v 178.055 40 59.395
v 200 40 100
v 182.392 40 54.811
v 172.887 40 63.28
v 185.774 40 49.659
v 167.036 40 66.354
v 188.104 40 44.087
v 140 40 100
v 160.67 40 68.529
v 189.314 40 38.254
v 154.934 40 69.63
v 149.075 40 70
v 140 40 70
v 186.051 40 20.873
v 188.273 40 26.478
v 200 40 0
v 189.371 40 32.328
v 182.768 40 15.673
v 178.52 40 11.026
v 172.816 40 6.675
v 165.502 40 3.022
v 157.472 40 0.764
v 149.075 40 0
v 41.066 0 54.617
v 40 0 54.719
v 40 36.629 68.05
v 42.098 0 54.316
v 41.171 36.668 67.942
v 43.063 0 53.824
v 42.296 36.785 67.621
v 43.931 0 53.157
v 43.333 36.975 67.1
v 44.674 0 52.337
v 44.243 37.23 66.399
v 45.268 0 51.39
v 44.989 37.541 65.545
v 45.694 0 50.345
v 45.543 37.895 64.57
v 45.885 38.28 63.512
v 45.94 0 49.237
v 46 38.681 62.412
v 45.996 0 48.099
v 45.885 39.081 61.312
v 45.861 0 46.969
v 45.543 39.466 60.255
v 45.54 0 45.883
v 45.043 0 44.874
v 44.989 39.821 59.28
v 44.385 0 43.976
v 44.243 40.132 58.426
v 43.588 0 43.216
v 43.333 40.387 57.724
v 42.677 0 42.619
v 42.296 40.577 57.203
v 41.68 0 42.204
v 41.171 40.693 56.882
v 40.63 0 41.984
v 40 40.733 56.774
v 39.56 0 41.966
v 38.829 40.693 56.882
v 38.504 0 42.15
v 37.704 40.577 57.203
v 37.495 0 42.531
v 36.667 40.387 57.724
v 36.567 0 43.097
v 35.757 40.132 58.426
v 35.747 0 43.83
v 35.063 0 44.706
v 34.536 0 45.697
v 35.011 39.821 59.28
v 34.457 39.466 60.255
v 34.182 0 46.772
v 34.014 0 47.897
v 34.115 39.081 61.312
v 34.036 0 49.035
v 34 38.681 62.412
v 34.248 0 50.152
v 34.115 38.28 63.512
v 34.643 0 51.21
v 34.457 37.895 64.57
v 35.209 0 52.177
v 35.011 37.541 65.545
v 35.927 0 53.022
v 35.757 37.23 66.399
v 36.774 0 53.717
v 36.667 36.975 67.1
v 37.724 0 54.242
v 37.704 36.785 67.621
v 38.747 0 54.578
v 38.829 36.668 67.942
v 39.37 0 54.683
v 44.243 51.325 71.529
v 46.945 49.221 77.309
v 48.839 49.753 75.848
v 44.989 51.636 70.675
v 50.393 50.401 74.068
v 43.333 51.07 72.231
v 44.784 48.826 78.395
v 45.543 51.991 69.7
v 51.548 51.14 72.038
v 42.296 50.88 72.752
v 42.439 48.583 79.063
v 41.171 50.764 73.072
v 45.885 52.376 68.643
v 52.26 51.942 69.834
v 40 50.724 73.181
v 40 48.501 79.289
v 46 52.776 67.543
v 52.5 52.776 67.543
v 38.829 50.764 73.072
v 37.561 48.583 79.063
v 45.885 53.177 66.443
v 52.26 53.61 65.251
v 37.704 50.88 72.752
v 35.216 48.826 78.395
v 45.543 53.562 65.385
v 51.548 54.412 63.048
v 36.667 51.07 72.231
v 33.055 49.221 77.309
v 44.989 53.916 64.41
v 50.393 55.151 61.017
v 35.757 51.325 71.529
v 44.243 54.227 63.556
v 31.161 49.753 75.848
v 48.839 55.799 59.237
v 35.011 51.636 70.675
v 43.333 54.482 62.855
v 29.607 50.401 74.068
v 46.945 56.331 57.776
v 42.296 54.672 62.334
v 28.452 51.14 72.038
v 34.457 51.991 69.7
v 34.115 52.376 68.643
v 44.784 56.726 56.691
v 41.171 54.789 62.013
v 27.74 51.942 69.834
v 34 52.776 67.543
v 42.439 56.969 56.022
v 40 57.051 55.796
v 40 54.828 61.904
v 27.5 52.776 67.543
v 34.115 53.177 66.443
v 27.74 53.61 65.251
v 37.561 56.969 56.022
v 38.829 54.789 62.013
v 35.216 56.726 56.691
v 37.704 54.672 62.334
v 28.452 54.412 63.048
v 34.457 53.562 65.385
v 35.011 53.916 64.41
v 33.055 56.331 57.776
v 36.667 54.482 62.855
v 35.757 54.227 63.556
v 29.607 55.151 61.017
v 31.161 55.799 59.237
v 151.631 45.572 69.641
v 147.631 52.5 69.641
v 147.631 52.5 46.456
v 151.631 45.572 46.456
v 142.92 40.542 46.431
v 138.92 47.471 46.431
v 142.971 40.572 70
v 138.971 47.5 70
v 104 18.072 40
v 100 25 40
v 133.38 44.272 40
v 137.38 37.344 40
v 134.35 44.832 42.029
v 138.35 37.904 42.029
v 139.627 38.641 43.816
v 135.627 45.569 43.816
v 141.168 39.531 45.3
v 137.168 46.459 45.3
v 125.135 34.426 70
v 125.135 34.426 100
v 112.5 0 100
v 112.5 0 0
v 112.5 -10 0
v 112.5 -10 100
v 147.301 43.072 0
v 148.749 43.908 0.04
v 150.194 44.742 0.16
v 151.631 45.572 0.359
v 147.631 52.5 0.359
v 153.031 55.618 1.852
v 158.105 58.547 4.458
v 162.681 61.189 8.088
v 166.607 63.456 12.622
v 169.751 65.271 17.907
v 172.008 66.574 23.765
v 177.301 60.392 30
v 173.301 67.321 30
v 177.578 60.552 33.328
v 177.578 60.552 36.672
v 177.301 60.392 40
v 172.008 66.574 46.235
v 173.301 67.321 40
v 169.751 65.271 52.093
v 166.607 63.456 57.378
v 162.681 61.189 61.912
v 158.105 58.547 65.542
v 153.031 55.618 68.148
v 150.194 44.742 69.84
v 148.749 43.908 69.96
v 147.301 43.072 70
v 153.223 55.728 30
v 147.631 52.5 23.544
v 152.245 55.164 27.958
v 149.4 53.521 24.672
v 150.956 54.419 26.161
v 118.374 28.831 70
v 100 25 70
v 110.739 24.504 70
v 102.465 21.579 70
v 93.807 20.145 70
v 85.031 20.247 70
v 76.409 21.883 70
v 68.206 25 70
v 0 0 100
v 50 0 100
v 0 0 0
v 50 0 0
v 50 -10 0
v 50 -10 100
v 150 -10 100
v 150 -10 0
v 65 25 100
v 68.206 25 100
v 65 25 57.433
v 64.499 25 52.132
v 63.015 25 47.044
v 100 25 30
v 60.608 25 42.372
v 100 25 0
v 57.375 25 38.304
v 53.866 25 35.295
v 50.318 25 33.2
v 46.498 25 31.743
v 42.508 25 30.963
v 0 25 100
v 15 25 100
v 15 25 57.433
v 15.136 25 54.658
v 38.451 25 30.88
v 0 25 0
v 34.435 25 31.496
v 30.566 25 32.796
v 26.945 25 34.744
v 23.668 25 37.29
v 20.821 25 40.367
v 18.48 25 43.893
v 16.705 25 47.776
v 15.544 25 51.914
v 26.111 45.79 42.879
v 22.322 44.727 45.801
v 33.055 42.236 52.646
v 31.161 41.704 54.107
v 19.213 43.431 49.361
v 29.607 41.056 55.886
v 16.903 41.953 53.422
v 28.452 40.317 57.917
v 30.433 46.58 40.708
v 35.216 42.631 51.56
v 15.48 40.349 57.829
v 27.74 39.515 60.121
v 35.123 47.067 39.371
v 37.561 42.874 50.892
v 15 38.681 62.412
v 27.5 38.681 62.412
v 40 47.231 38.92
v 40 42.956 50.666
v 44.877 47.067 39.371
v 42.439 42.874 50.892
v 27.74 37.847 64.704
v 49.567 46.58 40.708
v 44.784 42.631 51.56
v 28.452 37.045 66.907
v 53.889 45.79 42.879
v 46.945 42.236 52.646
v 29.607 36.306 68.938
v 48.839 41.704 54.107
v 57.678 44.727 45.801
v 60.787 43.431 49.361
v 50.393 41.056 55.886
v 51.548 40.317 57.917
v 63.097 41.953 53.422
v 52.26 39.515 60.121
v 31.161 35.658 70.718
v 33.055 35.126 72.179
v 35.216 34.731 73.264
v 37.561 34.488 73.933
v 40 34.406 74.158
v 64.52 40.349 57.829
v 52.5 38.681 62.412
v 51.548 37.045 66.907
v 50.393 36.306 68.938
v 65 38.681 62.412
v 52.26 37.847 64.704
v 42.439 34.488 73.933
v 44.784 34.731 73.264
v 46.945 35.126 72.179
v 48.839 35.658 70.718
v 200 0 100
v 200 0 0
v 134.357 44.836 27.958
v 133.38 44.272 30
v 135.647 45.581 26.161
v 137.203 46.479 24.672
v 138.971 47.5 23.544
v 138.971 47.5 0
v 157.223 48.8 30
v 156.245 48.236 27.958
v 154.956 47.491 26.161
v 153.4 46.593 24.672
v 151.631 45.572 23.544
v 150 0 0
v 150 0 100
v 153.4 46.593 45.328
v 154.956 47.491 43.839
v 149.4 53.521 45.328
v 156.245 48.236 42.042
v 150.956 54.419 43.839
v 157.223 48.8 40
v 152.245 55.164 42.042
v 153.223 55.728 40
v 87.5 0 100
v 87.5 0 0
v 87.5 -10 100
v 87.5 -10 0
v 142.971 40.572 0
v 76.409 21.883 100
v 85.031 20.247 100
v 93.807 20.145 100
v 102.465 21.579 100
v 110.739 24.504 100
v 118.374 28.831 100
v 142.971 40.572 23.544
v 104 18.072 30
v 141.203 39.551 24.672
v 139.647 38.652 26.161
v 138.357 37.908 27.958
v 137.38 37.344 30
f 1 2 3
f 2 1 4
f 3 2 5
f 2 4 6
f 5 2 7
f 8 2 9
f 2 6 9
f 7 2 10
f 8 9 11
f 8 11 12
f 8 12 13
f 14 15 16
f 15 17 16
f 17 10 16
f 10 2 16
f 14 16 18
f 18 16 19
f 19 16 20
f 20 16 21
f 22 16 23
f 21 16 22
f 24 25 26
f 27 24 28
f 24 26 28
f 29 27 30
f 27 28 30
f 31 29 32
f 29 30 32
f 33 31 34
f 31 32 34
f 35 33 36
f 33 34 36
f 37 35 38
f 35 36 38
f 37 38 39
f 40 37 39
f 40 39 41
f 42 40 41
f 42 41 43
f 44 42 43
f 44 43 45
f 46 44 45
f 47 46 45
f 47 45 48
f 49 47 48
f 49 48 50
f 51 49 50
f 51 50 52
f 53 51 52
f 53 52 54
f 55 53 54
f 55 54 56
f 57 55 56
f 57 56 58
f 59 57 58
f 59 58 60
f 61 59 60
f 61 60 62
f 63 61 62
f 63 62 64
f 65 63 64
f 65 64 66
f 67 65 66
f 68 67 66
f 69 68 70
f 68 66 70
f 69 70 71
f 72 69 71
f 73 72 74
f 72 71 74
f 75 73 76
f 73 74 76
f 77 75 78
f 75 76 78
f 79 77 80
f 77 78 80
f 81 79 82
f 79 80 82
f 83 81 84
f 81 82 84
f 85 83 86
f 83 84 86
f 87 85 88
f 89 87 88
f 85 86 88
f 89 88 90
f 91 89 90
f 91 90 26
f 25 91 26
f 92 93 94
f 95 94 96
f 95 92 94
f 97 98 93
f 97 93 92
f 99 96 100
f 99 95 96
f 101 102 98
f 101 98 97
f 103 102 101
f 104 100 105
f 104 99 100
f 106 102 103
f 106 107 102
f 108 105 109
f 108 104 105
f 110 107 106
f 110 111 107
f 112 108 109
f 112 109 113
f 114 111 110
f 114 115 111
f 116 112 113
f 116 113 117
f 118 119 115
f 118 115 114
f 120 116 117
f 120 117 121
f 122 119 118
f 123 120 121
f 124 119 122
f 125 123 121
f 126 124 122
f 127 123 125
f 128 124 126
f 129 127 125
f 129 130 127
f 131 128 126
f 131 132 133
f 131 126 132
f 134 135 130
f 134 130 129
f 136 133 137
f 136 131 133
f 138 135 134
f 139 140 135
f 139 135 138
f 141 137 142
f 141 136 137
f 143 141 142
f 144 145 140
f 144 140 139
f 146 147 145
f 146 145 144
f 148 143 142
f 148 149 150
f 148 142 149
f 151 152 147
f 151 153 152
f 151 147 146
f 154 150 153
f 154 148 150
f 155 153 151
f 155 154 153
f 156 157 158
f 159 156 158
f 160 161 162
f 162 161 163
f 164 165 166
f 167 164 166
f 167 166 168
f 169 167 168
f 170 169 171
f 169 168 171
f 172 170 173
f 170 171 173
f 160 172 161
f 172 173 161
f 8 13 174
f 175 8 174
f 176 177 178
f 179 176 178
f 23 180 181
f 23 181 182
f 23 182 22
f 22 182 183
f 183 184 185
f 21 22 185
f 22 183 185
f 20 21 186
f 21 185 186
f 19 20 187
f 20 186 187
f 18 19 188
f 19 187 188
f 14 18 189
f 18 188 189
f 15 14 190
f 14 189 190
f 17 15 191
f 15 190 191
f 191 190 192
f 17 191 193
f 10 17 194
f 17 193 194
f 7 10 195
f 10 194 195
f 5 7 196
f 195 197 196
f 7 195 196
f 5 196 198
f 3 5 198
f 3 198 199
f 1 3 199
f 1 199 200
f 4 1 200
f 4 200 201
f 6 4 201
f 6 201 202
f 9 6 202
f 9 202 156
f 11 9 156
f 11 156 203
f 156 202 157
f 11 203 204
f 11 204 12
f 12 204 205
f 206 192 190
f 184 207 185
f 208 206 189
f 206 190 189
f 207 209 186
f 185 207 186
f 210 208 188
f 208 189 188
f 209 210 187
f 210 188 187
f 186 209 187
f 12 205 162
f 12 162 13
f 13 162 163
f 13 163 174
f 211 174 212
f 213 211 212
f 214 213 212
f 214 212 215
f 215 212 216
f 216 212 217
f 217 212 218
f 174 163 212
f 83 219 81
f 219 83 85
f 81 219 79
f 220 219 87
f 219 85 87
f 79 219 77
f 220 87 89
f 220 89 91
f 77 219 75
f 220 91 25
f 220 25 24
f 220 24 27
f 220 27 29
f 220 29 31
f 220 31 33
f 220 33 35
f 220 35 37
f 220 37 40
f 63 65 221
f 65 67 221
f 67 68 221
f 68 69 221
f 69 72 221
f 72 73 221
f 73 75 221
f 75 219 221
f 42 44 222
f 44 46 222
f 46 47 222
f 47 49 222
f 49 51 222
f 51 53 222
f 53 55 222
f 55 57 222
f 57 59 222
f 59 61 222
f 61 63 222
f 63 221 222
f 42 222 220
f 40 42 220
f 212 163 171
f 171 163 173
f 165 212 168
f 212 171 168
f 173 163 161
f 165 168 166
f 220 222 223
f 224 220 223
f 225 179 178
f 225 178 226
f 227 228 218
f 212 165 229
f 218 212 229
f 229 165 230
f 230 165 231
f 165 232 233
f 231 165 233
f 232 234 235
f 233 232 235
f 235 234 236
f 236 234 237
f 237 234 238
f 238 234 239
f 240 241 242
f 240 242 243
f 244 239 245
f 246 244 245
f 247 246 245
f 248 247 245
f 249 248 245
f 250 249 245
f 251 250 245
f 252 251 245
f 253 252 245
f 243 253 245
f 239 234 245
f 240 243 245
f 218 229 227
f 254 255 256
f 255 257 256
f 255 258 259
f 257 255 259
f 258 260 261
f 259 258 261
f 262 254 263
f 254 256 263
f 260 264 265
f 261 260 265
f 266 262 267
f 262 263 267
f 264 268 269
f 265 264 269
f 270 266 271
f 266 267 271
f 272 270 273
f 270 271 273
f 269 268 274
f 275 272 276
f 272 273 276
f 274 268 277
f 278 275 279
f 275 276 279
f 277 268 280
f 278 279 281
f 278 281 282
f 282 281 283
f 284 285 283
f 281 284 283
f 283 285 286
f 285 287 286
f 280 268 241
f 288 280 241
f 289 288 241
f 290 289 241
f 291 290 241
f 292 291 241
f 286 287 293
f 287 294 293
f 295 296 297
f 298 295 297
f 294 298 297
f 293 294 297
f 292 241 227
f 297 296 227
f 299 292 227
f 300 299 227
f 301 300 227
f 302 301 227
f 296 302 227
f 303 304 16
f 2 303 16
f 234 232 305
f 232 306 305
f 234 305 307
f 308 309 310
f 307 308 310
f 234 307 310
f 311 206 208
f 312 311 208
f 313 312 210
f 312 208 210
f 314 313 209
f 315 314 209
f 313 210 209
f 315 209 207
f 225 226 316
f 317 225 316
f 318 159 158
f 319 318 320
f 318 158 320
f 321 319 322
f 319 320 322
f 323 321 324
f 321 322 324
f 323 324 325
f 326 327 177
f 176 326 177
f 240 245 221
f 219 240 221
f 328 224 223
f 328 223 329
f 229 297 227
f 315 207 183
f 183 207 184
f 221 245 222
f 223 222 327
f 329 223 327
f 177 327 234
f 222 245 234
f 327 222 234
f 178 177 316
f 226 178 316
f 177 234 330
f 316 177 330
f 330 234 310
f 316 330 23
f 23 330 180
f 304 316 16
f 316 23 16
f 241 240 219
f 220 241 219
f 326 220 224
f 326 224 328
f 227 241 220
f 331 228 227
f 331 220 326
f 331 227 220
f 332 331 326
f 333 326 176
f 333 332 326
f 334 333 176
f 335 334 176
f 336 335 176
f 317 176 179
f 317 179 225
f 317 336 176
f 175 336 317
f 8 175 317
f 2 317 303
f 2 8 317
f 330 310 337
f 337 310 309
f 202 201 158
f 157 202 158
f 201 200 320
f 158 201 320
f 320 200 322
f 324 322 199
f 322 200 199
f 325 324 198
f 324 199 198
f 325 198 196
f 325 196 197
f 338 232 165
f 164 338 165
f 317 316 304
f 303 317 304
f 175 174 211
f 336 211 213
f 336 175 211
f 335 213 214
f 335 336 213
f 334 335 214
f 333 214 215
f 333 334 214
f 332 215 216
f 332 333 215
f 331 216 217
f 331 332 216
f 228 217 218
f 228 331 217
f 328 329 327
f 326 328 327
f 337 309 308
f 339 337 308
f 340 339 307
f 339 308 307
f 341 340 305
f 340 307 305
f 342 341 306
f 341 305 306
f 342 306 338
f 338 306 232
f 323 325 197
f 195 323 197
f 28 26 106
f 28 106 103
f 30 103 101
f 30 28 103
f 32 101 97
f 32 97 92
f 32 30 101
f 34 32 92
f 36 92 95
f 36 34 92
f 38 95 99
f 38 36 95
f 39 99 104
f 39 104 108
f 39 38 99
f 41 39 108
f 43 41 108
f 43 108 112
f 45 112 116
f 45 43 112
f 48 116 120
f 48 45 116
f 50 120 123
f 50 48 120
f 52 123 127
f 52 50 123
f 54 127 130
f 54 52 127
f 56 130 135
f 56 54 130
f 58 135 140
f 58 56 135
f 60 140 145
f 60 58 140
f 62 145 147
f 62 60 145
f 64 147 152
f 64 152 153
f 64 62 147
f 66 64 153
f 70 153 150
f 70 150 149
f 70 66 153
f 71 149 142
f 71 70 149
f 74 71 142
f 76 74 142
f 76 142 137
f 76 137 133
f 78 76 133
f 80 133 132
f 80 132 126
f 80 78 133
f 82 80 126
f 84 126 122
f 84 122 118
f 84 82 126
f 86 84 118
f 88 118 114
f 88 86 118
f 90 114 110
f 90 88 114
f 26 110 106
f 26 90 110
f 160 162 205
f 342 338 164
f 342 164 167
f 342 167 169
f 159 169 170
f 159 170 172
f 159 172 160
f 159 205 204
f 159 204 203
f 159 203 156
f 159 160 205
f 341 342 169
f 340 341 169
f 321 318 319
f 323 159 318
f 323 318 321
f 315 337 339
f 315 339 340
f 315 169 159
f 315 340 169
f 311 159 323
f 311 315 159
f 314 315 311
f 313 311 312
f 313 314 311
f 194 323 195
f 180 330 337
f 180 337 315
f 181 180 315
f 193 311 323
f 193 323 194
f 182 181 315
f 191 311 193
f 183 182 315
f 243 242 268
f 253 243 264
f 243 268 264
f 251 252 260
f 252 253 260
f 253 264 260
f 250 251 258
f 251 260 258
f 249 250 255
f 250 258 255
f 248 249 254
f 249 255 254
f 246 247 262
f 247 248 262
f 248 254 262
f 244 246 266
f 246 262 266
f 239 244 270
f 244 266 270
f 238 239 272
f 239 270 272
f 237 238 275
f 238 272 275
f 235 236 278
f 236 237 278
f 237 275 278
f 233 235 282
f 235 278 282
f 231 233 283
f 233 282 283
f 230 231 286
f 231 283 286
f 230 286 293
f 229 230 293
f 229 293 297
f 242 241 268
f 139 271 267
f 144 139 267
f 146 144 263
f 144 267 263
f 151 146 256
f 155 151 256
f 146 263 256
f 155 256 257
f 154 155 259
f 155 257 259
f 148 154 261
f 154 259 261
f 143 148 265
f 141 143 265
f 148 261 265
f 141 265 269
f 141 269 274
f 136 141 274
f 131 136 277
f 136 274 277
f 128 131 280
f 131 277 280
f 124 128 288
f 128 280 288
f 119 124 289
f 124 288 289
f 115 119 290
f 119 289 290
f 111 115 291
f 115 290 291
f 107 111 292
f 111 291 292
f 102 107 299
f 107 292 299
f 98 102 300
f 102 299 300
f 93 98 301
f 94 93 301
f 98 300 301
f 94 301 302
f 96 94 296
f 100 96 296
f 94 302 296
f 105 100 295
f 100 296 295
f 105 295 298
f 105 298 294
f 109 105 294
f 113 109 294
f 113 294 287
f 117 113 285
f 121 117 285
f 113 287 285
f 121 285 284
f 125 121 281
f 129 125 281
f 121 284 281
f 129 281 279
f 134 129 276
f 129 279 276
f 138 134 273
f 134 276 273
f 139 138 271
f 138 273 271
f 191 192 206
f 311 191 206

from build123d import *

# Parameters (mm, degrees)
BOSS_EXTRUDE3_DEPTH = 100
BOSS_EXTRUDE4_REACH = 226.87
SKETCH5_4_R         = 12.5
SKETCH5_4_R_2       = 6
BOSS_EXTRUDE5_DEPTH = 15
SKETCH7_R           = 6
CUT_EXTRUDE1_DEPTH  = 225.869761917
BOSS_EXTRUDE7_DEPTH = 35
CUT_EXTRUDE2_DEPTH  = 8
CUT_EXTRUDE3_DEPTH  = 30


with BuildPart() as part:
    # Sketch4 → Boss-Extrude3 (new body)
    with BuildSketch(Plane.XY):
        Polygon((0, 0), (50, 0), (50, -10), (87.5, -10), (87.5, 0), (112.5, 0), (112.5, -10), (150, -10), (150, 0), (200, 0), (200, 40), (140, 40), (100, 25), (0, 25), align=None)
    extrude(amount=BOSS_EXTRUDE3_DEPTH)

    # Boss-Extrude4: up to this face of the body (flat: up to its plane)
    boss_extrude4_end = Plane(part.part.faces().sort_by_distance((50, 25, 50))[0])
    # Sketch5 → Boss-Extrude4 (add, up to the picked face)
    with BuildSketch(Plane(origin=(0, 54.214936023, 19.732622965), x_dir=(-1, 0, 0), z_dir=(0, 0.9396926207859081, 0.34202014332566943)), mode=Mode.PRIVATE) as boss_extrude4_sk1:
        with BuildLine():
            Line((-15, 85.418758495), (-15, 45.418758495))
            ThreePointArc((-15, 45.418758495), (-40, 20.418758495), (-65, 45.418758495))
            Line((-65, 45.418758495), (-65, 85.418758495))
            Line((-65, 85.418758495), (-15, 85.418758495))
        make_face()
    boss_extrude4_tool1 = split(extrude(boss_extrude4_sk1.sketch, amount=-BOSS_EXTRUDE4_REACH, mode=Mode.PRIVATE), bisect_by=boss_extrude4_end, keep=Keep.BOTH, mode=Mode.PRIVATE)
    add(boss_extrude4_tool1.solids().sort_by(Axis((40, 35.287462, 71.735431), (0, -0.9396926207859081, -0.34202014332566943)))[0])

    # Sketch5<4> → Boss-Extrude5 (add)
    with BuildSketch(Plane(origin=(0, 54.214936023, 19.732622965), x_dir=(-1, 0, 0), z_dir=(0, 0.9396926207859081, 0.34202014332566943))):
        with Locations(Location((-40, 45.418758495, 0), (0, 0, 270))):
            Circle(SKETCH5_4_R)
        with Locations(Location((-40, 45.418758495, 0), (0, 0, 90))):
            Circle(SKETCH5_4_R_2, mode=Mode.SUBTRACT)
    extrude(amount=BOSS_EXTRUDE5_DEPTH)

    # Sketch7 → Cut-Extrude1 (cut, through all)
    with BuildSketch(Plane(origin=(0, 54.214936023, 19.732622965), x_dir=(1, 0, 0), z_dir=(0, 0.9396926207859082, 0.34202014332566943))):
        with Locations(Location((40, -45.418758495, 0), (0, 0, 270))):
            Circle(SKETCH7_R)
    extrude(amount=-CUT_EXTRUDE1_DEPTH, mode=Mode.SUBTRACT)

    # Sketch8 → Boss-Extrude7 (add)
    with BuildSketch(Plane(origin=(14.174682453, -24.551270189, 0), x_dir=(0, 0, -1), z_dir=(0.49999999999999506, -0.8660254037844415, 0))):
        with BuildLine():
            Line((0, 99.102540378), (0, 149.102540378))
            ThreePointArc((0, 149.102540378), (-35, 184.102540378), (-70, 149.102540378))
            Line((-70, 149.102540378), (-70, 99.102540378))
            Line((-70, 99.102540378), (0, 99.102540378))
        make_face()
    extrude(amount=BOSS_EXTRUDE7_DEPTH)

    # Sketch9 → Cut-Extrude2 (cut)
    with BuildSketch(Plane(origin=(14.174682453, -24.551270189, 0), x_dir=(0.8660254037844415, 0.4999999999999951, 0), z_dir=(-0.49999999999999517, 0.8660254037844416, 0))):
        with BuildLine():
            Line((99.102540378, -40), (137.646101141, -40))
            ThreePointArc((137.646101141, -40), (140.241070616, -43.816141653), (144.043854376, -46.430647223))
            Line((144.043854376, -46.430647223), (144.102540378, -70))
            Line((144.102540378, -70), (154.102540378, -70))
            Line((154.102540378, -70), (154.102540378, -46.456439237))
            ThreePointArc((154.102540378, -46.456439237), (157.941375143, -43.838834765), (160.558979616, -40))
            Line((160.558979616, -40), (184.102540378, -40))
            Line((184.102540378, -40), (184.102540378, -30))
            Line((184.102540378, -30), (160.558979616, -30))
            ThreePointArc((160.558979616, -30), (157.941375143, -26.161165235), (154.102540378, -23.543560763))
            Line((154.102540378, -23.543560763), (154.102540378, 0))
            Line((154.102540378, 0), (144.102540378, 0))
            Line((144.102540378, 0), (144.102540378, -23.543560763))
            ThreePointArc((144.102540378, -23.543560763), (140.263705614, -26.161165235), (137.646101141, -30))
            Line((137.646101141, -30), (99.102540378, -30))
            Line((99.102540378, -30), (99.102540378, -40))
        make_face()
    extrude(amount=-CUT_EXTRUDE2_DEPTH, mode=Mode.SUBTRACT)

    # Sketch10 → Cut-Extrude3 (cut)
    with BuildSketch(Plane.XY.offset(100)):
        with BuildLine():
            Line((66.16880238, 26.04463605), (66.16880238, 113.95536395))
            ThreePointArc((66.16880238, 113.95536395), (140, 70), (66.16880238, 26.04463605))
        make_face()
    extrude(amount=-CUT_EXTRUDE3_DEPTH, mode=Mode.SUBTRACT)


solid = part.part
